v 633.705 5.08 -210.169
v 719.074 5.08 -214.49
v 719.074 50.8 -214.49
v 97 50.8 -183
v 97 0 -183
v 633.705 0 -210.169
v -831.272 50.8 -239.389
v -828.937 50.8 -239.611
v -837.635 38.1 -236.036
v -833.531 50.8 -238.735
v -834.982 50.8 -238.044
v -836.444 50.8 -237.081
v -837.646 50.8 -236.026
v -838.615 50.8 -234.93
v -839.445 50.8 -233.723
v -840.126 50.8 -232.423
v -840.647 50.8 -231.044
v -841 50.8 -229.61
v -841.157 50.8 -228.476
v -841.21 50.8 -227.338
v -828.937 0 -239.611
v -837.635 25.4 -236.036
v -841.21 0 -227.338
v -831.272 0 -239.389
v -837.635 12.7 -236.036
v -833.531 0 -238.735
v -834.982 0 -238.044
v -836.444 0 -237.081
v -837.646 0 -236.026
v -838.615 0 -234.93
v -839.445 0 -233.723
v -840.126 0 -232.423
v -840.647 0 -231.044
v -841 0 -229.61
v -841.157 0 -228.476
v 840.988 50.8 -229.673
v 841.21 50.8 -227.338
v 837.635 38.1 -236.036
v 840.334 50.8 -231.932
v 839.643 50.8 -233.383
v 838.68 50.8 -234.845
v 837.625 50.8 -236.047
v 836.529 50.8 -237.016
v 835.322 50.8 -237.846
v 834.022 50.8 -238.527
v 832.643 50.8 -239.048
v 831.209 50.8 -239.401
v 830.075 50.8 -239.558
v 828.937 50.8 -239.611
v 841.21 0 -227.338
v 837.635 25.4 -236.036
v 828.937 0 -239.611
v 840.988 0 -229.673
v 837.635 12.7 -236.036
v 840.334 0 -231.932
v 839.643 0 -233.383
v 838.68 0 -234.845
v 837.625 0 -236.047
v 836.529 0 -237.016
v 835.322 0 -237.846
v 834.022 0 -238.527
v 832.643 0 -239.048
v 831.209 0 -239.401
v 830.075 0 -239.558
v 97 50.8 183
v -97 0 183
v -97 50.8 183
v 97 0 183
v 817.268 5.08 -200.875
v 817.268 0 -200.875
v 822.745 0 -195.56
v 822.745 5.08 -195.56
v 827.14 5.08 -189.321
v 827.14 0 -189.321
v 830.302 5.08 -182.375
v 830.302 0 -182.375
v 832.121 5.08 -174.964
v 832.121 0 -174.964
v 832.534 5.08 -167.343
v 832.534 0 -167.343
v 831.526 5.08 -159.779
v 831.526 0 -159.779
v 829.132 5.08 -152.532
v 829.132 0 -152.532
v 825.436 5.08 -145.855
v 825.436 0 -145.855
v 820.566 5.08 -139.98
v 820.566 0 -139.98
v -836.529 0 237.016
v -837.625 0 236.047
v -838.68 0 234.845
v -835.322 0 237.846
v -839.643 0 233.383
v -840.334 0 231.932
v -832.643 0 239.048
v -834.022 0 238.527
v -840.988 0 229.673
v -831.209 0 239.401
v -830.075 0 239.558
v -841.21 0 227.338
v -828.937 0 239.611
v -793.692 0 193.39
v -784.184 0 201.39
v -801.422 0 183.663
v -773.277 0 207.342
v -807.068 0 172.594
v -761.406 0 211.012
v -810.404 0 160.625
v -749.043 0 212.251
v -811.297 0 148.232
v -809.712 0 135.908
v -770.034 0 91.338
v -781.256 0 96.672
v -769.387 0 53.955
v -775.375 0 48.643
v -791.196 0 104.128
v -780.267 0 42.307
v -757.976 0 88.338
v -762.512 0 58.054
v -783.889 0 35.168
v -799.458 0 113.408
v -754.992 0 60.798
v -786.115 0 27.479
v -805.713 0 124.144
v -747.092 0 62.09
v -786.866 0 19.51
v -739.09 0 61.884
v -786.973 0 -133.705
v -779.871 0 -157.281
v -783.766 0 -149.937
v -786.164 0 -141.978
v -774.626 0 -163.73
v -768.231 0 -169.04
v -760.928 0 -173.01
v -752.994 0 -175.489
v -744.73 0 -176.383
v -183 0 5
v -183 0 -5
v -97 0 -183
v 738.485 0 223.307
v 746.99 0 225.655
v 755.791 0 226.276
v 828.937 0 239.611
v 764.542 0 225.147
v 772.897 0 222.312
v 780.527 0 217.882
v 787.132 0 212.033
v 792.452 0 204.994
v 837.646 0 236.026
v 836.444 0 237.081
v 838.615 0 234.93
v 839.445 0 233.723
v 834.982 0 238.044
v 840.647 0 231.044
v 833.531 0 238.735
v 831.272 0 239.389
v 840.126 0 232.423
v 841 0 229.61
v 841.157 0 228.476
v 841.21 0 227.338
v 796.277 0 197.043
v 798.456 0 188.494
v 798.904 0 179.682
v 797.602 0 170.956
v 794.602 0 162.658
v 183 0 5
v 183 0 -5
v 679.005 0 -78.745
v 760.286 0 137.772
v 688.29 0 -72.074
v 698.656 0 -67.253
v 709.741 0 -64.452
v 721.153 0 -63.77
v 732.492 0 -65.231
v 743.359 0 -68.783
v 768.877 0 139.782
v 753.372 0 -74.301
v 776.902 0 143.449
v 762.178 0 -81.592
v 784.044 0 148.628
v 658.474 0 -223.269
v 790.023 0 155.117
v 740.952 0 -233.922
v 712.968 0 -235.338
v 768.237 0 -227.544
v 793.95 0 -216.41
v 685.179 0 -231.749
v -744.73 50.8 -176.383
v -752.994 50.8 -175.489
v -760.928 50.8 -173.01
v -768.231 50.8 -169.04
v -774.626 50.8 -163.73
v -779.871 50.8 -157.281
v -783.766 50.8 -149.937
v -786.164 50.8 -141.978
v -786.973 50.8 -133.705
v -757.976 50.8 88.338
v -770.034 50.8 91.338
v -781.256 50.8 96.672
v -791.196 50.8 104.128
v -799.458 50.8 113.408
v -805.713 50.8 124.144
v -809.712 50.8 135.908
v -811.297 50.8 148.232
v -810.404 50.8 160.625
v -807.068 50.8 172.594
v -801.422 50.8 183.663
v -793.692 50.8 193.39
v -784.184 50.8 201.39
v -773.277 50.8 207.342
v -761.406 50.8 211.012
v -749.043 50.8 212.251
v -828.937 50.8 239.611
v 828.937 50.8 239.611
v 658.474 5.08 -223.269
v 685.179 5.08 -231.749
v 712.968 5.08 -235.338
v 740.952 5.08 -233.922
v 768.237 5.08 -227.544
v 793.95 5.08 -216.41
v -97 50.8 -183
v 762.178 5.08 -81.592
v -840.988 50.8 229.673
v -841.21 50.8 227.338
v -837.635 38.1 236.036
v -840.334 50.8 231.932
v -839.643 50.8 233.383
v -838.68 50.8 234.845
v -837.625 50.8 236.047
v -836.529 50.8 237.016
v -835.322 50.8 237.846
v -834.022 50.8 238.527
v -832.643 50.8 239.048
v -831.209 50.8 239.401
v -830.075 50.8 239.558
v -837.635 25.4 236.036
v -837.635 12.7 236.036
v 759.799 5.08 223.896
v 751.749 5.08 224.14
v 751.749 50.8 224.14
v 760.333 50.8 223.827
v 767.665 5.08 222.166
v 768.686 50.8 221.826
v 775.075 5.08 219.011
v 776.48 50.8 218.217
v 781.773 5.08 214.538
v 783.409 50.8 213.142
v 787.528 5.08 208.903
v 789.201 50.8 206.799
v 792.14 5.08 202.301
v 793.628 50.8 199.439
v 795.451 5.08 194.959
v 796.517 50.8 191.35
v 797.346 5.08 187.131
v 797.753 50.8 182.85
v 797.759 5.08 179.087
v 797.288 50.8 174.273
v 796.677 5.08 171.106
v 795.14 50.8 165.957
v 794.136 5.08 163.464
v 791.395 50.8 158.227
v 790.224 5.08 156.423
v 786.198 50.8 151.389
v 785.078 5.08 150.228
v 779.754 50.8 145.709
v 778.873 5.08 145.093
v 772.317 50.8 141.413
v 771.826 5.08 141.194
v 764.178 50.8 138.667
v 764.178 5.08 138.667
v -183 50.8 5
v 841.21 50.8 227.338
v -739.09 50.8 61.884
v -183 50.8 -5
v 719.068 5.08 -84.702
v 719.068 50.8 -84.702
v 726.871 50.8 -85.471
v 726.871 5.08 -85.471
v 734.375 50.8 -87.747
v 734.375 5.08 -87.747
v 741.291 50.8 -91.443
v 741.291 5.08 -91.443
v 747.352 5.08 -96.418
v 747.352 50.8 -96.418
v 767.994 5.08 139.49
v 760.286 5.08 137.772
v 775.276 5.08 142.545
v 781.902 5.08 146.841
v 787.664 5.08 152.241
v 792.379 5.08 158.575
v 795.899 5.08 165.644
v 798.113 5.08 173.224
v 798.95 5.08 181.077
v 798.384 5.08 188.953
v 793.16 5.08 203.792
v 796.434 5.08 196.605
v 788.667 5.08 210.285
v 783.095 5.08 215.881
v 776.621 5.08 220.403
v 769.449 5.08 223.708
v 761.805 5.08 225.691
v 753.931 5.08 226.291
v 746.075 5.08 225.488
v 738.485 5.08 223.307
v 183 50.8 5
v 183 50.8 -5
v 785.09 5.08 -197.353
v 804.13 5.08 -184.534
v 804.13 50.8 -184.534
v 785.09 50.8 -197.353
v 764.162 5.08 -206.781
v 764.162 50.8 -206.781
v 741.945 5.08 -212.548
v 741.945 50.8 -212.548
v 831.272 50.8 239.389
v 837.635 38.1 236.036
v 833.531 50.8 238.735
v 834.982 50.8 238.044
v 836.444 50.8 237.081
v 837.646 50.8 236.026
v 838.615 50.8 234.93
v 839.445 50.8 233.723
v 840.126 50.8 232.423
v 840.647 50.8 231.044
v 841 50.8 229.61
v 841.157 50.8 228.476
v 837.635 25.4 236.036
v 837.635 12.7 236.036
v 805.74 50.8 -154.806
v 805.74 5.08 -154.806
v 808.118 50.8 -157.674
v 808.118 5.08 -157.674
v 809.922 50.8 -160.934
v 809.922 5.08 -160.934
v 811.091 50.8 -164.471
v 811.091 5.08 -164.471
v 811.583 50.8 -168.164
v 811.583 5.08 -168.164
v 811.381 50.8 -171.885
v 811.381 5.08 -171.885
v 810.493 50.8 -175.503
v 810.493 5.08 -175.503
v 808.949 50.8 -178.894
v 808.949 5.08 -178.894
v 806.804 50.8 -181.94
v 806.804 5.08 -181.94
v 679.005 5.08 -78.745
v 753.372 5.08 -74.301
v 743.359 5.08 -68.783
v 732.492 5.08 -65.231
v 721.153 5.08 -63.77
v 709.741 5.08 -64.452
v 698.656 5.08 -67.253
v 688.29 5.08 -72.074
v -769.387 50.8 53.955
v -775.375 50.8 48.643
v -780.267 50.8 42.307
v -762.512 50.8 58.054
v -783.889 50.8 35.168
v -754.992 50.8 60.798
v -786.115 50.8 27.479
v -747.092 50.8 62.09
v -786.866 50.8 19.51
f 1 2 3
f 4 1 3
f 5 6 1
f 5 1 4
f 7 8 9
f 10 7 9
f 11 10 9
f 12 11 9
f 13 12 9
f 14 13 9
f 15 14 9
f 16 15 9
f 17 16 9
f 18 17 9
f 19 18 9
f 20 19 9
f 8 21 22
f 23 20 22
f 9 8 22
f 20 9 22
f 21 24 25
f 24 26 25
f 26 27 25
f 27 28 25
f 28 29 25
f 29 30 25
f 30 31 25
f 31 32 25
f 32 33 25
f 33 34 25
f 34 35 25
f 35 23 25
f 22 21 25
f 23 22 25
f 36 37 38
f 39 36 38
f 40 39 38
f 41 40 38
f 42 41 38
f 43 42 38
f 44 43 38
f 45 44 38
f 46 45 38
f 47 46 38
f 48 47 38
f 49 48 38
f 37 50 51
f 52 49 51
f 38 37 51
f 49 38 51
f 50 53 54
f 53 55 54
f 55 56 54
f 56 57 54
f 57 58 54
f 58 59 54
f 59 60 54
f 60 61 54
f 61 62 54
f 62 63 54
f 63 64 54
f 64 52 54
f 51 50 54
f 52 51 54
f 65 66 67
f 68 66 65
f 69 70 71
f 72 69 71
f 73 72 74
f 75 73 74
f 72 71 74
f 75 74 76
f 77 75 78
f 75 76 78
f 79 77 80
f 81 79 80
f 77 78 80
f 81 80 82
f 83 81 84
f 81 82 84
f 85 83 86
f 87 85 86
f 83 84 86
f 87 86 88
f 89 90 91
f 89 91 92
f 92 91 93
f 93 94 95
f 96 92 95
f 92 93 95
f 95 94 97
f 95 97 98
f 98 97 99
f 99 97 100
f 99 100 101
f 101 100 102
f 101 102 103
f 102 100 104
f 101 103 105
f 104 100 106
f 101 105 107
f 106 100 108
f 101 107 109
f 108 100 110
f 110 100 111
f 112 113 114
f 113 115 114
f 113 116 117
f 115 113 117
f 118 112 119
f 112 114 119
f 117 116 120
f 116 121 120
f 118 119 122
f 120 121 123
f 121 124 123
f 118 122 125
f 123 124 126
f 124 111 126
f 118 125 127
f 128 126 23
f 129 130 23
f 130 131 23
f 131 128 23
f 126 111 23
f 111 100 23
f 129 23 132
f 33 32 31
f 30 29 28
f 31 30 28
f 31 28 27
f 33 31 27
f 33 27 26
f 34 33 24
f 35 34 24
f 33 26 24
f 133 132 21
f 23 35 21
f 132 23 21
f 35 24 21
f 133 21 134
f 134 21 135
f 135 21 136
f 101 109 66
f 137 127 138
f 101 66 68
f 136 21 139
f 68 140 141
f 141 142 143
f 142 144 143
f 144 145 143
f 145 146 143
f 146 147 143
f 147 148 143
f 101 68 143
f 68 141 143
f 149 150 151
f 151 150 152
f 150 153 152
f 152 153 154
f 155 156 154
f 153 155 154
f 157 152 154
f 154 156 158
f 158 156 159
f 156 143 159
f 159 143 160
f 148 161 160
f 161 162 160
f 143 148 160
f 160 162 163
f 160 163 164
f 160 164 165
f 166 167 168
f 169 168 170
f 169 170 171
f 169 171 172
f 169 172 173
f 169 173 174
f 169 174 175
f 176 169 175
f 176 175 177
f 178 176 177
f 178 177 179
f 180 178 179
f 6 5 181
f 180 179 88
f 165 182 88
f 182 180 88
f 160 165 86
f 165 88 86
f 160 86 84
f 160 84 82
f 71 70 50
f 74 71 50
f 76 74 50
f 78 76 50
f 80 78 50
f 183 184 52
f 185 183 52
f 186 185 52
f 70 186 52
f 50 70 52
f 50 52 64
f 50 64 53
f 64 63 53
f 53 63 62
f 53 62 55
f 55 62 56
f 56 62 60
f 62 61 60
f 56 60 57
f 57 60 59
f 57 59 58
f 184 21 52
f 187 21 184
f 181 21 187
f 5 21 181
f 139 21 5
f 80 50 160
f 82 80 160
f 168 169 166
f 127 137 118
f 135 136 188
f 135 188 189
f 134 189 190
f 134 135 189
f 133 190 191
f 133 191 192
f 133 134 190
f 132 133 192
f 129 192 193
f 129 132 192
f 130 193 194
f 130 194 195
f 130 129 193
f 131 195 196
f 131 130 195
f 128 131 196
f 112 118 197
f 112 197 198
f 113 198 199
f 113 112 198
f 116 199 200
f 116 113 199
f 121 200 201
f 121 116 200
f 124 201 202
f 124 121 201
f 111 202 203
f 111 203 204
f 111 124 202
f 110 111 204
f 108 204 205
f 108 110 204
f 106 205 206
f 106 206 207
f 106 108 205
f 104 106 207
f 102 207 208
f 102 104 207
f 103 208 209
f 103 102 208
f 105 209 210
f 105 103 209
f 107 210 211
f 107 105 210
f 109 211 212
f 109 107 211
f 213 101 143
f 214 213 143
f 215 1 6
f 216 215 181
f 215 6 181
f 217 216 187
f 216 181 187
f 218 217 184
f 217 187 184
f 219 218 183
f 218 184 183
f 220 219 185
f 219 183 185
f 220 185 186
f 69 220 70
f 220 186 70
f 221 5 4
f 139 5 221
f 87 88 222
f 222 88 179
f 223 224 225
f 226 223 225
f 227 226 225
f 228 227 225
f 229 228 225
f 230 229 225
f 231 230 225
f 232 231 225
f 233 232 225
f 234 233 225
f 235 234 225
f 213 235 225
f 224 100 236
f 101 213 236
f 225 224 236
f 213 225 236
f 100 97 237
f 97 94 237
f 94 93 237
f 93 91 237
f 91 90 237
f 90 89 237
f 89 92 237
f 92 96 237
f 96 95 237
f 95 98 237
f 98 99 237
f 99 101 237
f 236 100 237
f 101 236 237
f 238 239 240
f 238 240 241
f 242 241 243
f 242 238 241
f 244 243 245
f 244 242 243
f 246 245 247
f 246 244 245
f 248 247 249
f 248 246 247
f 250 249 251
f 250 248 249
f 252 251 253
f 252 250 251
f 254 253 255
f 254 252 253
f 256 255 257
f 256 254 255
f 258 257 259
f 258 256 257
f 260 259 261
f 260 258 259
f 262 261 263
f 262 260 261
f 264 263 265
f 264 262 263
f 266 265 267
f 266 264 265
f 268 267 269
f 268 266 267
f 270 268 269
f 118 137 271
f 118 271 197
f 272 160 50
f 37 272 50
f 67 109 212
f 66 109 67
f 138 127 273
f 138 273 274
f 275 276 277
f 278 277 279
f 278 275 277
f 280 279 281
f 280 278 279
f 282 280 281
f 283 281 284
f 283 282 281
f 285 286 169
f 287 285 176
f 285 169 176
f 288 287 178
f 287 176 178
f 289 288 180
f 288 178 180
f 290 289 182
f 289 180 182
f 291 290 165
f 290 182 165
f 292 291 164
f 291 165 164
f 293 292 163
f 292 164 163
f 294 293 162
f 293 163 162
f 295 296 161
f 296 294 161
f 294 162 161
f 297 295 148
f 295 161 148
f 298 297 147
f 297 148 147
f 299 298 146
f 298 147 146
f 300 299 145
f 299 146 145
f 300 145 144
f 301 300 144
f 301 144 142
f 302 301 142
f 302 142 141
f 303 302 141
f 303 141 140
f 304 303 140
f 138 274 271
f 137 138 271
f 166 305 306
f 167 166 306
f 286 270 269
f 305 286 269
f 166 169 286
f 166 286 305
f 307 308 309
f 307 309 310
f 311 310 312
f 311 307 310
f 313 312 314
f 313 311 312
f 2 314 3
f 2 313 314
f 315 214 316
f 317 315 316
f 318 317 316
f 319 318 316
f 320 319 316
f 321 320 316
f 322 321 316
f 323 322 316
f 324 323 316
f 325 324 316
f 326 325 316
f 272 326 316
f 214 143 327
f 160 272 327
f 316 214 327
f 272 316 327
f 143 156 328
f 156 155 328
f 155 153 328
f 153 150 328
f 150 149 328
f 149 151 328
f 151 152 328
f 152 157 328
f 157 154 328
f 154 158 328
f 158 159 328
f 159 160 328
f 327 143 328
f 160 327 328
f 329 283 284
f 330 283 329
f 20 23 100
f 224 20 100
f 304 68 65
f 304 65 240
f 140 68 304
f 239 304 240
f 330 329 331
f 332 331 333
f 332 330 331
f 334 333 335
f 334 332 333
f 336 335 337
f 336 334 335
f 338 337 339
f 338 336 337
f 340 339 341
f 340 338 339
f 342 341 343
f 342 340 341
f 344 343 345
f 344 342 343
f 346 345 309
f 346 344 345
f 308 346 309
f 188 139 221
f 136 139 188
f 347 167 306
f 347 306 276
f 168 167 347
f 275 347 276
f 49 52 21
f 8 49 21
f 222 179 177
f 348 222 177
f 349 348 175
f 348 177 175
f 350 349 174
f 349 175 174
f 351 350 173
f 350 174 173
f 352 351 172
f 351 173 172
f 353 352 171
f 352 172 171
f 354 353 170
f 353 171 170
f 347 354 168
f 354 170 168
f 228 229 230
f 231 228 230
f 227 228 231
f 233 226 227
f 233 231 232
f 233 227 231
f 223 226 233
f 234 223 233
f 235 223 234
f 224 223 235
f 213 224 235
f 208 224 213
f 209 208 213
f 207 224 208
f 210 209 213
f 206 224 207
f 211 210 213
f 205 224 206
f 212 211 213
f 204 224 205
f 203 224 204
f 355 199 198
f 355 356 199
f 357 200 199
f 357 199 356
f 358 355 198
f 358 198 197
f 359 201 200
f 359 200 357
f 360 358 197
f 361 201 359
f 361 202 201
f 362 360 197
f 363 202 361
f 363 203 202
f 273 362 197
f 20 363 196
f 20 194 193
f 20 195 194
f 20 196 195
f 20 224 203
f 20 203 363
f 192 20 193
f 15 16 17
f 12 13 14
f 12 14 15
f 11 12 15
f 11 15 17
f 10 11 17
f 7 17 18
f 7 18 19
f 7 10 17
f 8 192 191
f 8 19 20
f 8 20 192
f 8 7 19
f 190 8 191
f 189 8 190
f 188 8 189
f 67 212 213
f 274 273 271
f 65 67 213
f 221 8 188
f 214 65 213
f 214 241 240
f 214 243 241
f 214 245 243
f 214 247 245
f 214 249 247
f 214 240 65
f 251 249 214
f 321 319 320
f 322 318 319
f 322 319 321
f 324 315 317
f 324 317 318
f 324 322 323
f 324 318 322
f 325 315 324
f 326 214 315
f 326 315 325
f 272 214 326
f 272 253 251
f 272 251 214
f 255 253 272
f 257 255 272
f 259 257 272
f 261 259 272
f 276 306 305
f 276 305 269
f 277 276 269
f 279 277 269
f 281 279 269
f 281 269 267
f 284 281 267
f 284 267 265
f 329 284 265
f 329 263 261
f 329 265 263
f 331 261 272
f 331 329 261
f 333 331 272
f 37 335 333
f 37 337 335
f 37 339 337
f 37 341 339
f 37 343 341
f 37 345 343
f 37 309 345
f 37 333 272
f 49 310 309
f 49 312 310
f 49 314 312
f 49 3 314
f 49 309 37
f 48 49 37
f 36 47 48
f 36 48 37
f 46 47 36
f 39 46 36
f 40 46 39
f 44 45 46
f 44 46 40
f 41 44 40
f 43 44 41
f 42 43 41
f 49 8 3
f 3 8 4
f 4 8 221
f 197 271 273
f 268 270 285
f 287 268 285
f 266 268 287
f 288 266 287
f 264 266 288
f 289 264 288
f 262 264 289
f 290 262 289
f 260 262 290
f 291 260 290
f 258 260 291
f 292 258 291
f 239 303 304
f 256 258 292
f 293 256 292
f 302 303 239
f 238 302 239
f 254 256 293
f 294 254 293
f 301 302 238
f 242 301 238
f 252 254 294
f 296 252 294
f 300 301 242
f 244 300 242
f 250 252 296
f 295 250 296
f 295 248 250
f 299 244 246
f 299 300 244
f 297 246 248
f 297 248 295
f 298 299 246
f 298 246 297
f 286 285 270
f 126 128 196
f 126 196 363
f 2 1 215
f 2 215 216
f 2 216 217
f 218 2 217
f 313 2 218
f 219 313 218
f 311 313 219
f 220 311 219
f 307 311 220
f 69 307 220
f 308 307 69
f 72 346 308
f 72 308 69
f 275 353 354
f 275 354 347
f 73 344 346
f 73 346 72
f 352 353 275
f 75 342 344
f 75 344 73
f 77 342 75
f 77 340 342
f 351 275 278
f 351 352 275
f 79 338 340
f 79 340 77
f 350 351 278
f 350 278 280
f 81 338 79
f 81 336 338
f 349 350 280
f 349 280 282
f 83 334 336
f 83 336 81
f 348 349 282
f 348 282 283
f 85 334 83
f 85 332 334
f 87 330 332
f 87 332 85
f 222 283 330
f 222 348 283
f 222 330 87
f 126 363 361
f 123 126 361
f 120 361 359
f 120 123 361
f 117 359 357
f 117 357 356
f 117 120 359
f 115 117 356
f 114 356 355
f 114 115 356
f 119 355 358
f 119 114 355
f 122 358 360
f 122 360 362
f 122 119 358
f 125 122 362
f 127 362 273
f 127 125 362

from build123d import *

# Parameters (mm, degrees)
BOSS_EXTRUDE3_DEPTH = 50.8
SKETCH3_R           = 44.45
CUT_EXTRUDE1_DEPTH  = 5.08


with BuildPart() as part:
    # Sketch2 → Boss-Extrude3 (new body)
    with BuildSketch(Plane(origin=(0, 0, 0), x_dir=(1, 0, 0), z_dir=(0, 1, 0))):
        with BuildLine():
            Line((828.937277778, 239.610630395), (-828.937277778, 239.610630395))
            add(Edge.make_bspline(
                [(-828.937277778, 239.610630395), (-830.5402629, 239.610630395), (-833.790113095, 238.979161906), (-837.861109298, 236.262109298), (-840.578161906, 232.191113095), (-841.209630395, 228.9412629), (-841.209630395, 227.338277778)],
                knots=[-0.770319033, -0.770319033, -0.770319033, -0.770319033, -0.385159516, 0, 0.385159516, 0.770319033, 0.770319033, 0.770319033, 0.770319033], degree=3))
            Line((-841.209630395, 227.338277778), (-841.209630395, -227.338277778))
            add(Edge.make_bspline(
                [(-841.209630395, -227.338277778), (-841.209630395, -228.9412629), (-840.578161906, -232.191113095), (-837.861109298, -236.262109298), (-833.790113095, -238.979161906), (-830.5402629, -239.610630395), (-828.937277778, -239.610630395)],
                knots=[-0.770319033, -0.770319033, -0.770319033, -0.770319033, -0.385159516, 0, 0.385159516, 0.770319033, 0.770319033, 0.770319033, 0.770319033], degree=3))
            Line((-828.937277778, -239.610630395), (828.937277778, -239.610630395))
            add(Edge.make_bspline(
                [(828.937277778, -239.610630395), (830.5402629, -239.610630395), (833.790113095, -238.979161906), (837.861109298, -236.262109298), (840.578161906, -232.191113095), (841.209630395, -228.9412629), (841.209630395, -227.338277778)],
                knots=[-0.770319033, -0.770319033, -0.770319033, -0.770319033, -0.385159516, 0, 0.385159516, 0.770319033, 0.770319033, 0.770319033, 0.770319033], degree=3))
            Line((841.209630395, -227.338277778), (841.209630395, 227.338277778))
            add(Edge.make_bspline(
                [(841.209630395, 227.338277778), (841.209630395, 228.9412629), (840.578161906, 232.191113095), (837.861109298, 236.262109298), (833.790113095, 238.979161906), (830.5402629, 239.610630395), (828.937277778, 239.610630395)],
                knots=[-0.770319033, -0.770319033, -0.770319033, -0.770319033, -0.385159516, 0, 0.385159516, 0.770319033, 0.770319033, 0.770319033, 0.770319033], degree=3))
        make_face()
        with BuildLine():
            Line((183, 5), (719.067867535, 84.701940777))
            ThreePointArc((719.067867535, 84.701940777), (734.37520483, 87.746759477), (747.352138783, 96.41766953))
            Line((747.352138783, 96.41766953), (805.740119782, 154.805650529))
            ThreePointArc((805.740119782, 154.805650529), (811.568721914, 170.02928211), (804.130185735, 184.534444667))
            ThreePointArc((804.130185735, 184.534444667), (764.162148174, 206.781275976), (719.074, 214.489999861))
            Line((719.074, 214.489999861), (97, 183))
            Line((97, 183), (-97, 183))
            Line((-97, 183), (-744.729609, 176.382687101))
            ThreePointArc((-744.729609, 176.382687101), (-774.626285266, 163.729853371), (-786.973045304, 133.705480442))
            Line((-786.973045304, 133.705480442), (-786.865578677, -19.509544471))
            ThreePointArc((-786.865578677, -19.509544471), (-772.505899638, -51.439554767), (-739.089614065, -61.883586467))
            Line((-739.089614065, -61.883586467), (-183, 5))
            Line((-183, 5), (-183, -5))
            Line((-183, -5), (-757.976293163, -88.338177387))
            ThreePointArc((-757.976293163, -88.338177387), (-811.160134278, -154.450903881), (-749.042879972, -212.251079294))
            Line((-749.042879972, -212.251079294), (-97, -183))
            Line((-97, -183), (97, -183))
            Line((97, -183), (751.749025656, -224.140342752))
            ThreePointArc((751.749025656, -224.140342752), (797.345746833, -187.130639885), (764.1784404, -138.667160105))
            Line((764.1784404, -138.667160105), (183, -5))
            Line((183, -5), (183, 5))
        make_face(mode=Mode.SUBTRACT)
    extrude(amount=BOSS_EXTRUDE3_DEPTH)

    # Sketch3 → Cut-Extrude1 (cut)
    with BuildSketch(Plane.XZ):
        with Locations((754.506388348, 181.844577047)):
            Circle(SKETCH3_R)
        with BuildLine():
            Line((820.56615944, -139.979610872), (762.17817844, -81.591629872))
            ThreePointArc((762.17817844, -81.591629872), (719.067867535, -63.734754417), (675.95755663, -81.591629872))
            Line((675.95755663, -81.591629872), (617.569575631, -139.979610872))
            ThreePointArc((617.569575631, -139.979610872), (605.630504143, -171.163078474), (620.867299038, -200.874863358))
            ThreePointArc((620.867299038, -200.874863358), (719.067867535, -235.45718636), (817.268436033, -200.874863358))
            ThreePointArc((817.268436033, -200.874863358), (832.505230927, -171.163078474), (820.56615944, -139.979610872))
        make_face()
    extrude(amount=-CUT_EXTRUDE1_DEPTH, mode=Mode.SUBTRACT)


solid = part.part
